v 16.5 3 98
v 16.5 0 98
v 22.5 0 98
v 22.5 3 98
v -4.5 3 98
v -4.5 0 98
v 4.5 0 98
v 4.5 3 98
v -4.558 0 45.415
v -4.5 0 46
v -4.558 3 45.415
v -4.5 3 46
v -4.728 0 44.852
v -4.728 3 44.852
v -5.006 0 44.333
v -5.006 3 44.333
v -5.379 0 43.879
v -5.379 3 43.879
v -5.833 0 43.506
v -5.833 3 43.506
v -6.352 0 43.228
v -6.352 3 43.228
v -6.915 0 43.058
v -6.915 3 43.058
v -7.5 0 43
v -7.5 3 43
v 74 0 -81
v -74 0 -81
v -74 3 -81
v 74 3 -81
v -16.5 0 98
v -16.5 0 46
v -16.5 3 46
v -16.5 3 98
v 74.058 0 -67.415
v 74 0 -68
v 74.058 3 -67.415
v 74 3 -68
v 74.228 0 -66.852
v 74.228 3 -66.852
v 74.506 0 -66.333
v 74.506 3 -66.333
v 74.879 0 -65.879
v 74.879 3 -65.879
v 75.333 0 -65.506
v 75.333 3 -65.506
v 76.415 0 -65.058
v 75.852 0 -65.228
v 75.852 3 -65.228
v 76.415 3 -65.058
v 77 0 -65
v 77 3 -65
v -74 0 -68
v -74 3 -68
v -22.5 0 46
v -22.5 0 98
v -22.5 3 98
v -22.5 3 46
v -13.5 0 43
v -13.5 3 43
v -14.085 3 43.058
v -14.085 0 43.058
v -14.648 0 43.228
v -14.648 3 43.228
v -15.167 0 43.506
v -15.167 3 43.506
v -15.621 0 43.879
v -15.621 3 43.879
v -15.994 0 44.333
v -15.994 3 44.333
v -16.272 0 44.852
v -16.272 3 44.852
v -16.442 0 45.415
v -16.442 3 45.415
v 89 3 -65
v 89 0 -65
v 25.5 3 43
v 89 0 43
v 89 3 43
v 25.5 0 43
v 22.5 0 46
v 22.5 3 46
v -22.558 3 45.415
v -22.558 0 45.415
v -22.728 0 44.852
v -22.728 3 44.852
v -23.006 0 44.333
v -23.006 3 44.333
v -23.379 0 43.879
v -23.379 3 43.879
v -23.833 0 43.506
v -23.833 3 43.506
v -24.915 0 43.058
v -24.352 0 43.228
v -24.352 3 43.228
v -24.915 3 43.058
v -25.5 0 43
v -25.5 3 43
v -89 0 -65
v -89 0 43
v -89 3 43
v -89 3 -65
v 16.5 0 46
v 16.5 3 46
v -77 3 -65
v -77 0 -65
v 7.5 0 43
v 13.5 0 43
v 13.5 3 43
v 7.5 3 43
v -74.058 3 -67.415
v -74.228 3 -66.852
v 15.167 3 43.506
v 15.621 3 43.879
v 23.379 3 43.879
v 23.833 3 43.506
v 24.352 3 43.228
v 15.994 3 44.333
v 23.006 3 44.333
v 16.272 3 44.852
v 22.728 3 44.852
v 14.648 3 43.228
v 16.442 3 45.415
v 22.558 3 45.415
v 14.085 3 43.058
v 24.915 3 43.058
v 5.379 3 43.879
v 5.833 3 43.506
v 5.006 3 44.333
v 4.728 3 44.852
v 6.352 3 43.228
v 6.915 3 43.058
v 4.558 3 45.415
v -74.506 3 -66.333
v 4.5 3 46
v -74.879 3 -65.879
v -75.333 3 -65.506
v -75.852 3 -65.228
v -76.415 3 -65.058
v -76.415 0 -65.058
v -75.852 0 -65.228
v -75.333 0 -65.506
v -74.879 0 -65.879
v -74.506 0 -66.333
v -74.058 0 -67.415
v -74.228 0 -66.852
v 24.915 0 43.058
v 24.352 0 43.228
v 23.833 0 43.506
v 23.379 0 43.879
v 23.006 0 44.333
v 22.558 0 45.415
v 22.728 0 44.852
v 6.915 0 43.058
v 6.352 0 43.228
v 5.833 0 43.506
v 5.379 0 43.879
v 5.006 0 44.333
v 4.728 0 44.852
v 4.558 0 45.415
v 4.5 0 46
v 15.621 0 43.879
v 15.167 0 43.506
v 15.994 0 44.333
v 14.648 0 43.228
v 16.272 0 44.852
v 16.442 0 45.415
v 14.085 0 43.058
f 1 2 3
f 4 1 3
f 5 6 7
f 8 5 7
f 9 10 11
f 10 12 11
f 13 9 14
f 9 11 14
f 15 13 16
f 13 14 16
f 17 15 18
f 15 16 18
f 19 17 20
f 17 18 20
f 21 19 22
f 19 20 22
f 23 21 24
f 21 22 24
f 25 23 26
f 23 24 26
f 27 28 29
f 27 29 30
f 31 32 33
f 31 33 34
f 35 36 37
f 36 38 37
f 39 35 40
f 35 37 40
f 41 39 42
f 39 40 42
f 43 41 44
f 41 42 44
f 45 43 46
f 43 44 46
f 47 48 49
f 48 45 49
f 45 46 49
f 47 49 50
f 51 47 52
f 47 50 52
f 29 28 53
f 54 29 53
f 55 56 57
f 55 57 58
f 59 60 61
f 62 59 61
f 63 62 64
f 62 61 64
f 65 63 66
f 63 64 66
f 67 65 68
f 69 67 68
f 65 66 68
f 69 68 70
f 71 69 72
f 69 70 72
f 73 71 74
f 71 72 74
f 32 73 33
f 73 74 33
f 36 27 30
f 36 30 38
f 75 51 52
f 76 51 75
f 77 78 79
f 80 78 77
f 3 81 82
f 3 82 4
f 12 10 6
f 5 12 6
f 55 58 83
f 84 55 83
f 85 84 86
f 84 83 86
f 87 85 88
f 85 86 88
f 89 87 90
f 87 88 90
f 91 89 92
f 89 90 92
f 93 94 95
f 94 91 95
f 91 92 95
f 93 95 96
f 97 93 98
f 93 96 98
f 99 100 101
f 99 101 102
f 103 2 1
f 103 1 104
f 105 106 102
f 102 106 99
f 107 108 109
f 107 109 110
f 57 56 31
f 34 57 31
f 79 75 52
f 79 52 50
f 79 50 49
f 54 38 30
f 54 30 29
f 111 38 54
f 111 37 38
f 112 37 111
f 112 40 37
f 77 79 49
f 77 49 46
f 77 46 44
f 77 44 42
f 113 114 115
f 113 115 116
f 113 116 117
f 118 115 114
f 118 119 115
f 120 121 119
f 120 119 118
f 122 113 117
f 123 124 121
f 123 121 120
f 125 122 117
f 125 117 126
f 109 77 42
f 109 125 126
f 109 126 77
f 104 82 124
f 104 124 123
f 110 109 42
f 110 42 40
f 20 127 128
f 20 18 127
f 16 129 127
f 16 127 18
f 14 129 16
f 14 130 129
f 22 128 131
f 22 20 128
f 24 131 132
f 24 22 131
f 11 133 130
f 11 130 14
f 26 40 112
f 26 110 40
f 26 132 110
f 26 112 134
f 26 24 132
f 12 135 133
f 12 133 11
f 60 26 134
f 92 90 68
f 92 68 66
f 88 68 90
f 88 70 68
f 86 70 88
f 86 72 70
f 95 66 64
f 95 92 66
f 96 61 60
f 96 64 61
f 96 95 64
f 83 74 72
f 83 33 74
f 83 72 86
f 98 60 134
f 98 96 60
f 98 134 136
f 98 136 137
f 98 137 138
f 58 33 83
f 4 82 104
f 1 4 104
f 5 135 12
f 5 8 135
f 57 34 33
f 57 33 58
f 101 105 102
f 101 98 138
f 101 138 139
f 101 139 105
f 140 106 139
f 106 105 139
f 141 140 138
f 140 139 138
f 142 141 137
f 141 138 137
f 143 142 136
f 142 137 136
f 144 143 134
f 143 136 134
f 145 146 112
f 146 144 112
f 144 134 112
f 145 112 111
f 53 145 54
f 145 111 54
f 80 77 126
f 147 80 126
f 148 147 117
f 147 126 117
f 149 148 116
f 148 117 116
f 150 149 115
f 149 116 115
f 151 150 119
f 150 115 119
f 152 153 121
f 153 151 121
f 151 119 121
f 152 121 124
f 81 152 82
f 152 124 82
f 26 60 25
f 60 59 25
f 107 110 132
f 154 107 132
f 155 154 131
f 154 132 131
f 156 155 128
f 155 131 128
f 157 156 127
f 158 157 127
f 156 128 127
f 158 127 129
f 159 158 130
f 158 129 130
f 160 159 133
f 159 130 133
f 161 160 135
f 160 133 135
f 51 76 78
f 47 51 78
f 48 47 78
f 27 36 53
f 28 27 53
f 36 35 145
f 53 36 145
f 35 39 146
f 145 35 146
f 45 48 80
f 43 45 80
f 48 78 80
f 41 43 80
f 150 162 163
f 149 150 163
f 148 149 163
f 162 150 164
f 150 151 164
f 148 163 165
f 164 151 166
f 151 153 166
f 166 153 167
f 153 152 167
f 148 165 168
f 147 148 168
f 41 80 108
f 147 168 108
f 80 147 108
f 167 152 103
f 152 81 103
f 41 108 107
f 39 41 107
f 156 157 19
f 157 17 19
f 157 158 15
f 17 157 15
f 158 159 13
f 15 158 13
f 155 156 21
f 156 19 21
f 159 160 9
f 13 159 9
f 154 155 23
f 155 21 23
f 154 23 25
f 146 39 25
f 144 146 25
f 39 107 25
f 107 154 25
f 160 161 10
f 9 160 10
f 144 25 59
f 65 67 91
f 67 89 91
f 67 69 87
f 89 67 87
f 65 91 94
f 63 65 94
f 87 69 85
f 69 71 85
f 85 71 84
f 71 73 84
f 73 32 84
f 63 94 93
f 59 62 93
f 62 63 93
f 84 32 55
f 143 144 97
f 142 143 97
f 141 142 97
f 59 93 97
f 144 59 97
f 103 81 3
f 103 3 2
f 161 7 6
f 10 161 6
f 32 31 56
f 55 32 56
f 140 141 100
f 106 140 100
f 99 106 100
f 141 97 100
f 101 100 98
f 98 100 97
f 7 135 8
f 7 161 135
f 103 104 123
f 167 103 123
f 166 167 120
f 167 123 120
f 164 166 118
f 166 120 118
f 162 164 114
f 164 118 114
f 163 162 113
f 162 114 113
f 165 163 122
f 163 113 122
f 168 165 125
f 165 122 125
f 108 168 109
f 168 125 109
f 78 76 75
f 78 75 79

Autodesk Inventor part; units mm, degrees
ref_plane "YZ Plane" through (0, 0, 0) normal (1, 0, 0) x (0, 1, 0)
ref_plane "XZ Plane" through (0, 0, 0) normal (0, 1, 0) x (-1, 0, 0)
ref_plane "XY Plane" through (0, 0, 0) normal (0, 0, 1) x (1, 0, 0)
sketch "Sketch2" plane through (0, 0, 0) normal (0, 1, 0) x (-1, 0, 0)
  line L0 (-89, 99) -> (89, 99)
  line L1 (89, 99) -> (89, -99)
  line L2 (89, -99) -> (-89, -99)
  line L3 (-89, -99) -> (-89, 99)
  line L4 (-89, 99) -> (89, -99) construction
  line L5 (89, 99) -> (-89, -99) construction
  line L6 (-89, 99) -> (89, 99)
  line L7 (89, 99) -> (89, -81)
  line L8 (89, -81) -> (-89, -81)
  line L9 (-89, -81) -> (-89, 99)
  line L10 (-4.5, 99) -> (-89, 99)
  line L11 (-89, 99) -> (-89, 43)
  line L12 (-89, 43) -> (-4.5, 43)
  line L13 (-4.5, 43) -> (-4.5, 99)
  line L14 (4.5, 99) -> (89, 99)
  line L15 (89, 99) -> (89, 43)
  line L16 (89, 43) -> (4.5, 43)
  line L17 (4.5, 43) -> (4.5, 99)
  line L18 (22.5, 77.5) -> (22.5, 66.5) projected
  line L19 (16.5, 66.5) -> (16.5, 77.5) projected
  line L20 (-22.5, 66.5) -> (-22.5, 77.5) projected
  line L21 (-16.5, 77.5) -> (-16.5, 66.5) projected
  line L22 (-22.5, 99) -> (-16.5, 99)
  line L23 (-16.5, 99) -> (-16.5, 43)
  line L24 (-16.5, 43) -> (-22.5, 43)
  line L25 (-22.5, 43) -> (-22.5, 99)
  line L26 (16.5, 99) -> (22.5, 99)
  line L27 (22.5, 99) -> (22.5, 43)
  line L28 (22.5, 43) -> (16.5, 43)
  line L29 (16.5, 43) -> (16.5, 99)
  line L30 (-89, 99) -> (89, 99)
  line L31 (89, 99) -> (89, 98)
  line L32 (89, 98) -> (-89, 98)
  line L33 (-89, 98) -> (-89, 99)
  line L34 (89, -81) -> (74, -81)
  line L35 (74, -81) -> (74, -65)
  line L36 (74, -65) -> (89, -65)
  line L37 (89, -65) -> (89, -81)
  line L38 (-89, -81) -> (-74, -81)
  line L39 (-74, -81) -> (-74, -65)
  line L40 (-74, -65) -> (-89, -65)
  line L41 (-89, -65) -> (-89, -81)
  point P0 (0, 0)
  point P1 (4.5, 99)
  point P2 (-4.5, 99)
  point P3 (-89, 43)
  point P4 (89, 43)
  point P5 (4.5, 98)
  point P6 (-4.5, 98)
  point P7 (-16.5, 98)
  point P8 (-22.5, 98)
  point P9 (22.5, 98)
  point P10 (16.5, 98)
  dimension "d8" = 178
  dimension "d9" = 198
  dimension "d10" = 18
  dimension "d11" = 84.5
  dimension "d13" = 84.5
  dimension "d17" = 9
  dimension "d18" = 1
  dimension "d19" = 15
  dimension "d20" = 16
  dimension "d21" = 15
  dimension "d22" = 16
  dimension "d75" = 55
  dimension "d76" = 55
extrude "Extrusion2" add sketch "Sketch2" along normal blind 3 contours L32 L23 L21 L12 L25 L20 | L12 L13 L32 L17 L16 L1 L36 L35 L8 L39 L40 L3 | L32 L27 L18 L16 L29 L19
fillet "Fillet1" radius 3 6 edges at (22.5, 1.5, 43) (-22.5, 1.5, 43) (-16.5, 1.5, 43) (-4.5, 1.5, 43) (4.5, 1.5, 43) (16.5, 1.5, 43)
fillet "Fillet2" radius 3 2 edges at (74, 1.5, -65) (-74, 1.5, -65)
equation "\"d11\" = d13"
properties part number "base" material "Aluminum 6061"
